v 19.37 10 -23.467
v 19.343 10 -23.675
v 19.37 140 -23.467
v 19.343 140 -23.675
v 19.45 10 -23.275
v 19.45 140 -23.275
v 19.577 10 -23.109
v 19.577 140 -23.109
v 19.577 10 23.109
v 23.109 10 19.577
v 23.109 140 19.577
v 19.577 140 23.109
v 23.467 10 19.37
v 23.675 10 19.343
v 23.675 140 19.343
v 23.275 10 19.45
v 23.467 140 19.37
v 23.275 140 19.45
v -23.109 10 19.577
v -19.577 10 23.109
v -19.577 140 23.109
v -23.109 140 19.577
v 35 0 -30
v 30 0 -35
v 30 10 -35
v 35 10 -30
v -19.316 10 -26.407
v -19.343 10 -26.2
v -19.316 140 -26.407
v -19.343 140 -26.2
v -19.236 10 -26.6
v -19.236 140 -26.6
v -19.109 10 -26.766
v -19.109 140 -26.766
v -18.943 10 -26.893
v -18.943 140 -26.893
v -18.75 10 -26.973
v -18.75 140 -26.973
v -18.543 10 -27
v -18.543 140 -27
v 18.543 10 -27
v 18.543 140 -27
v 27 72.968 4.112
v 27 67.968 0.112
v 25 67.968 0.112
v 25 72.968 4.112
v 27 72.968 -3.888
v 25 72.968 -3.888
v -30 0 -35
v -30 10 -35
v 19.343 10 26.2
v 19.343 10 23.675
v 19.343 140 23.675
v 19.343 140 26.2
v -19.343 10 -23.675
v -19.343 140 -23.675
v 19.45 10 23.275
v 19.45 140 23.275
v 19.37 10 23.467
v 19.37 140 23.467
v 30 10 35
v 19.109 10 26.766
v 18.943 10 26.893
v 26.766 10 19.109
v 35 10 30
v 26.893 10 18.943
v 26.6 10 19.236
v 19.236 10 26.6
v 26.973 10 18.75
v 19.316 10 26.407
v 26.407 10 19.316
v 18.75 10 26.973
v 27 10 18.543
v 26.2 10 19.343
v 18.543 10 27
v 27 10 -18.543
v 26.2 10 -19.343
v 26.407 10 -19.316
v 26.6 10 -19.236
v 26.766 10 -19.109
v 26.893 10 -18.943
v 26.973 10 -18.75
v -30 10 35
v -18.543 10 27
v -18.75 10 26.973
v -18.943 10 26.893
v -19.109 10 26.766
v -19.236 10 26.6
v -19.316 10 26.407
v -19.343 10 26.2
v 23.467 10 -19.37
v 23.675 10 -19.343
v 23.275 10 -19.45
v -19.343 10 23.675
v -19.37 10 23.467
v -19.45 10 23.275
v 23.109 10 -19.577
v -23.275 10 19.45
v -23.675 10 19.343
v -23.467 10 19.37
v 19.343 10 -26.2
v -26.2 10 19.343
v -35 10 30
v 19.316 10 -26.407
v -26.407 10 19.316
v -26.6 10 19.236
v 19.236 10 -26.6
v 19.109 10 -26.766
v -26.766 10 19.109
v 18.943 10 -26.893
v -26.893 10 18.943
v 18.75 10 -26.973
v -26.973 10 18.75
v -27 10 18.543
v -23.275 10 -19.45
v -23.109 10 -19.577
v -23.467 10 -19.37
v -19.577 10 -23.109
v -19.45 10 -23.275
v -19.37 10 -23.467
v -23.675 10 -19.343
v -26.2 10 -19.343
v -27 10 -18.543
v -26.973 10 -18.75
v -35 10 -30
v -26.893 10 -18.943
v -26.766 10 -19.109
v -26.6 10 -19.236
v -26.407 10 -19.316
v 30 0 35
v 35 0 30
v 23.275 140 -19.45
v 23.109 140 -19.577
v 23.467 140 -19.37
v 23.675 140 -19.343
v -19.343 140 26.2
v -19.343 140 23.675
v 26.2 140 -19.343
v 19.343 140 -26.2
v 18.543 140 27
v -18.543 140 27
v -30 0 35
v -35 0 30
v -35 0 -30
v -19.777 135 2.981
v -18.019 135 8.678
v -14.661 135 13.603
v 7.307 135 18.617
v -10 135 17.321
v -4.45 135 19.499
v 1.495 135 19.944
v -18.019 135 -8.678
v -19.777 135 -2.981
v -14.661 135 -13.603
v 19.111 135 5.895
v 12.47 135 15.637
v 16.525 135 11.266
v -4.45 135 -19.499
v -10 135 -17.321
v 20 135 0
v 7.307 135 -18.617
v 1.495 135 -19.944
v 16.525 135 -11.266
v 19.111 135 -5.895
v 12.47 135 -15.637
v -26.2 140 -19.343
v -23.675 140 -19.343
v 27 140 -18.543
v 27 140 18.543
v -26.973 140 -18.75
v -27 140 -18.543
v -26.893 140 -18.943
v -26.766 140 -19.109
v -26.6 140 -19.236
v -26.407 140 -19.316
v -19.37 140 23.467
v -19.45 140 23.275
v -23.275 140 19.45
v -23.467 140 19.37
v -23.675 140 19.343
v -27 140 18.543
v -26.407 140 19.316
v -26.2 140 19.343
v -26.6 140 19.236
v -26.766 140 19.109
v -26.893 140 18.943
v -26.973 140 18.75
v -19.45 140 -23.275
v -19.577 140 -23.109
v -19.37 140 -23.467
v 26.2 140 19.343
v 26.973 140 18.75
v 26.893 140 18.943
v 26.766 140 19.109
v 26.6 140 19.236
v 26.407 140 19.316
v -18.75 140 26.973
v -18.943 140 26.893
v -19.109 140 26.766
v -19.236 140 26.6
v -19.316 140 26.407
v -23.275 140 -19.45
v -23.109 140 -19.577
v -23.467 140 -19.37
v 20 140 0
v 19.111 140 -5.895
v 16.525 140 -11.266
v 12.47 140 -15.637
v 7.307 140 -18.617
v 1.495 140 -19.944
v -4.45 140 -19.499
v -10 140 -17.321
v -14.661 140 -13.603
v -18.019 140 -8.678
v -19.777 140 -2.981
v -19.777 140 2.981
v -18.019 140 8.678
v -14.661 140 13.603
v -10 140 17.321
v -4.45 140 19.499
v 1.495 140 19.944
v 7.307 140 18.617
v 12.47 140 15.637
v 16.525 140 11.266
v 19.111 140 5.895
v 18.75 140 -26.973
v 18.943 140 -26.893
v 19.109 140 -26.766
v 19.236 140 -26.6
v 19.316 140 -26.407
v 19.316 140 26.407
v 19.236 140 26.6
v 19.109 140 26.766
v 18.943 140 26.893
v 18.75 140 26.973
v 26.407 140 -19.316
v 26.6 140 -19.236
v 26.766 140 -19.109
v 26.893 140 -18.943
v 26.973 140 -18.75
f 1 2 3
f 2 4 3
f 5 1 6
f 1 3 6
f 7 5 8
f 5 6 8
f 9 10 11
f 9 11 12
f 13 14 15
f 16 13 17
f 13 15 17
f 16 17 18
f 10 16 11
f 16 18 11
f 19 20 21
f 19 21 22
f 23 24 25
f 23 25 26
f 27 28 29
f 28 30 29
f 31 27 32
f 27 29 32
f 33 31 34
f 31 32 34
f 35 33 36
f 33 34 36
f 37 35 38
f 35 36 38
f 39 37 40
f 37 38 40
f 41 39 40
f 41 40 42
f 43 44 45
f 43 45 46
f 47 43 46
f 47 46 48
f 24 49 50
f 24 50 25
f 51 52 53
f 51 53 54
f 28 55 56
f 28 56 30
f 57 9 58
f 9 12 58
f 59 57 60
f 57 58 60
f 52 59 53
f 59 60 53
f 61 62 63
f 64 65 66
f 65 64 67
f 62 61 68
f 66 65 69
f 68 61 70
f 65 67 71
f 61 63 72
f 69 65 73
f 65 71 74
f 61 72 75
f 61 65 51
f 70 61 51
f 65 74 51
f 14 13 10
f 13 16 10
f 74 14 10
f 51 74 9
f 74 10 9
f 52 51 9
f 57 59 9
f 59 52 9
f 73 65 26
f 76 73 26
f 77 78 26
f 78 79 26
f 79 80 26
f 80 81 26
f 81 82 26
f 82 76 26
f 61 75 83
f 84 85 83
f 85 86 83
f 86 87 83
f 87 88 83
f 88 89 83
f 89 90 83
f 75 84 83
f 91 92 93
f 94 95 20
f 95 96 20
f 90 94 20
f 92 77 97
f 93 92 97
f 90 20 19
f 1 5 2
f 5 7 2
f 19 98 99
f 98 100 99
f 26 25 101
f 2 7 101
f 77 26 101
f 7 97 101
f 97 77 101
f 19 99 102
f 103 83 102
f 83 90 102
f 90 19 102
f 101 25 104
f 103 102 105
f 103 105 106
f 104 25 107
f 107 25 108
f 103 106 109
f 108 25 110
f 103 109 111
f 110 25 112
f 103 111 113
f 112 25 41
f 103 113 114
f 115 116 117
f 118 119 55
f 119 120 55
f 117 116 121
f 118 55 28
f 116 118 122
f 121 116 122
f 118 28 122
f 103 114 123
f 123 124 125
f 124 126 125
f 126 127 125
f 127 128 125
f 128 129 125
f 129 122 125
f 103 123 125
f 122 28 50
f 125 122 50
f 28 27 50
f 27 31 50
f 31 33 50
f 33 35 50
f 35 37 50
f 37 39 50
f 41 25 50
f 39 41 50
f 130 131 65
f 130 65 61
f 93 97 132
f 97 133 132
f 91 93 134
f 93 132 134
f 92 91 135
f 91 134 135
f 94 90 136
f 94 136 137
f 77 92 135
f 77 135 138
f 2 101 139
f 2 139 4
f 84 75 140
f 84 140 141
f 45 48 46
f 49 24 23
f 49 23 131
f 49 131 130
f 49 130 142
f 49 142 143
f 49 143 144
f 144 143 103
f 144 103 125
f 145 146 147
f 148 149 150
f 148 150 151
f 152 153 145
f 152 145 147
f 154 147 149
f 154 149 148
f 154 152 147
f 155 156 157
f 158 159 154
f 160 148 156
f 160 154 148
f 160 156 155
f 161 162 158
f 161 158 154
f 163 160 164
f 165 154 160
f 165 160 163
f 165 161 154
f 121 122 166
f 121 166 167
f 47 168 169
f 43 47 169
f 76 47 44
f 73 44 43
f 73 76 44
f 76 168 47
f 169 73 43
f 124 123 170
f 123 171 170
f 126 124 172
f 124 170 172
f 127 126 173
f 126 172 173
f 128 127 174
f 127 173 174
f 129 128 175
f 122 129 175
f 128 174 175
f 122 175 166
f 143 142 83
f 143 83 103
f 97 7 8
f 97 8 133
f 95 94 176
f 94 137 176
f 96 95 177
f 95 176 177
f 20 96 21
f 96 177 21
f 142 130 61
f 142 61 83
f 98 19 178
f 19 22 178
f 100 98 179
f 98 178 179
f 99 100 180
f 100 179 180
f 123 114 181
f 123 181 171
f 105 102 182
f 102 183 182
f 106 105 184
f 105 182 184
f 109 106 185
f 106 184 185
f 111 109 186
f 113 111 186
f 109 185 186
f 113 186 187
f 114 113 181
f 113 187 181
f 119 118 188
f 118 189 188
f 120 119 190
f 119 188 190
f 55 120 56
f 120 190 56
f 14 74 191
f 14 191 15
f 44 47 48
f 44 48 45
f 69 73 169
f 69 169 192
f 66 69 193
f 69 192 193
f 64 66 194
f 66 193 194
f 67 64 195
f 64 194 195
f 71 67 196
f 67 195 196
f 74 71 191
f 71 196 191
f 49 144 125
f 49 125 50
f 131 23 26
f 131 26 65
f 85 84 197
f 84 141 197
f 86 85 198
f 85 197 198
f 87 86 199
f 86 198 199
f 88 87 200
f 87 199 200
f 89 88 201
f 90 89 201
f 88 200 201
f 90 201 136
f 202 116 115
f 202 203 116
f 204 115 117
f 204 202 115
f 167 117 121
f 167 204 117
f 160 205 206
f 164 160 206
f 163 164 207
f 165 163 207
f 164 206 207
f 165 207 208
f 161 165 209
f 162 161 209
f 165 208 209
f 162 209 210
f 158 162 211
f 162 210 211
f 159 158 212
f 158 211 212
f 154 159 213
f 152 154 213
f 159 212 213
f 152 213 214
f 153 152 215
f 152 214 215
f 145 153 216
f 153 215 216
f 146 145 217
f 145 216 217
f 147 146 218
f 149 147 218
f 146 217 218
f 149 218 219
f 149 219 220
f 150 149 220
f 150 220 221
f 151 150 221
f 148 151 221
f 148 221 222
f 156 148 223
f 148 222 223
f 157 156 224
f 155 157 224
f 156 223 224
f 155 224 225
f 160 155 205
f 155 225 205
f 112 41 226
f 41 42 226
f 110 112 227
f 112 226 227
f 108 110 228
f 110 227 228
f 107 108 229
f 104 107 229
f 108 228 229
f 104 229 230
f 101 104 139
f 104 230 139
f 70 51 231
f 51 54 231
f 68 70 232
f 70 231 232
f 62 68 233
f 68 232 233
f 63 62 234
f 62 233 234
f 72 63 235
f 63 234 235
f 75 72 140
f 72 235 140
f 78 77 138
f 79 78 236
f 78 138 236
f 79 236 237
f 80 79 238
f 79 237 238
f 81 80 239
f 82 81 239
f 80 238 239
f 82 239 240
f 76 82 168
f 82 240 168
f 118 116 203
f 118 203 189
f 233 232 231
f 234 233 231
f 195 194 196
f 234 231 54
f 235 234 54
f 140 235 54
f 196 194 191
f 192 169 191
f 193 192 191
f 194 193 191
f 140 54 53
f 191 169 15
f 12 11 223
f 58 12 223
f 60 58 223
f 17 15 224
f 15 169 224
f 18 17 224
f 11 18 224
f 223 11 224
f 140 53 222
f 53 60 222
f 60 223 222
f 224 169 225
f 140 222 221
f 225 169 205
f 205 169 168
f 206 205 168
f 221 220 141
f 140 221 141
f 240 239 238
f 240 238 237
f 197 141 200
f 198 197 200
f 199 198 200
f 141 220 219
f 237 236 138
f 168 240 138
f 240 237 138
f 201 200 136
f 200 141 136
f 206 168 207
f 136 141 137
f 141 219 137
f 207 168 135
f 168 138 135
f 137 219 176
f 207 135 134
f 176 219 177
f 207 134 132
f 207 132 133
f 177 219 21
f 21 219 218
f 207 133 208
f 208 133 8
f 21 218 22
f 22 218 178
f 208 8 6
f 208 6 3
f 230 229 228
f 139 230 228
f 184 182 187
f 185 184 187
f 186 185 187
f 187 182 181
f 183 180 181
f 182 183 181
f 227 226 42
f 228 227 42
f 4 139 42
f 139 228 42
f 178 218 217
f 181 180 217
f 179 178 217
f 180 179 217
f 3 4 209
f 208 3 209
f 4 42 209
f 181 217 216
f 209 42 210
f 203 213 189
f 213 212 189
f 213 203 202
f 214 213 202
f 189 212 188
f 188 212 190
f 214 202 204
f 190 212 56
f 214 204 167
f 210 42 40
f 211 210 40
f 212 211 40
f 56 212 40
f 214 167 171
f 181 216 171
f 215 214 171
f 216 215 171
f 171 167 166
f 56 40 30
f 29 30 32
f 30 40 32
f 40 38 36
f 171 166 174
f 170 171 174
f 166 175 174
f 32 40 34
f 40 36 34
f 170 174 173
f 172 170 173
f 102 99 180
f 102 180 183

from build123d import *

# Parameters (mm, degrees)
BOSS_EXTRUDE1_DEPTH = 10
BOSS_EXTRUDE2_DEPTH = 130
FILLET1_R           = 0.8
SKETCH3_R           = 20
CUT_EXTRUDE1_DEPTH  = 5
CUT_EXTRUDE2_DEPTH  = 2


with BuildPart() as part:
    # Sketch1 → Boss-Extrude1 (new body)
    with BuildSketch(Plane(origin=(0, 0, 0), x_dir=(1, 0, 0), z_dir=(0, 1, 0))):
        Polygon((-35, 30), (-30, 35), (30, 35), (35, 30), (35, -30), (30, -35), (-30, -35), (-35, -30), align=None)
    extrude(amount=BOSS_EXTRUDE1_DEPTH)

    # Sketch2 → Boss-Extrude2 (add)
    with BuildSketch(Plane(origin=(0, 10, 0), x_dir=(1, 0, 0), z_dir=(0, 1, 0))):
        Polygon((-23.343145751, 19.343145751), (-19.343145751, 23.343145751), (-19.343145751, 27), (19.343145751, 27), (19.343145751, 23.343145751), (23.343145751, 19.343145751), (27, 19.343145751), (27, -19.343145751), (23.343145751, -19.343145751), (19.343145751, -23.343145751), (19.343145751, -27), (-19.343145751, -27), (-19.343145751, -23.343145751), (-23.343145751, -19.343145751), (-27, -19.343145751), (-27, 19.343145751), align=None)
    extrude(amount=BOSS_EXTRUDE2_DEPTH)

    # Fillet1
    fillet1_edges = [part.edges().sort_by_distance(p)[0] for p in [
        (27, 75, 19.343145751),
        (27, 75, -19.343145751),
        (23.343145751, 75, -19.343145751),
        (19.343145751, 75, -23.343145751),
        (19.343145751, 75, -27),
        (-19.343145751, 75, -27),
        (-19.343145751, 75, -23.343145751),
        (-23.343145751, 75, -19.343145751),
        (-27, 75, -19.343145751),
        (-27, 75, 19.343145751),
        (-23.343145751, 75, 19.343145751),
        (-19.343145751, 75, 23.343145751),
        (-19.343145751, 75, 27),
        (19.343145751, 75, 27),
        (19.343145751, 75, 23.343145751),
        (23.343145751, 75, 19.343145751),
    ]]
    fillet(fillet1_edges, radius=FILLET1_R)

    # Sketch3 → Cut-Extrude1 (cut)
    with BuildSketch(Plane(origin=(0, 140, 0), x_dir=(1, 0, 0), z_dir=(0, 1, 0))):
        Circle(SKETCH3_R)
    extrude(amount=-CUT_EXTRUDE1_DEPTH, mode=Mode.SUBTRACT)

    # Sketch5 → Cut-Extrude2 (cut)
    with BuildSketch(Plane(origin=(27, 0, 0), x_dir=(0, 0, -1), z_dir=(1, 0, 0))):
        Polygon((-4.112253732, 72.96796578), (3.887746268, 72.96796578), (-0.112253732, 67.96796578), align=None)
    extrude(amount=-CUT_EXTRUDE2_DEPTH, mode=Mode.SUBTRACT)


solid = part.part
